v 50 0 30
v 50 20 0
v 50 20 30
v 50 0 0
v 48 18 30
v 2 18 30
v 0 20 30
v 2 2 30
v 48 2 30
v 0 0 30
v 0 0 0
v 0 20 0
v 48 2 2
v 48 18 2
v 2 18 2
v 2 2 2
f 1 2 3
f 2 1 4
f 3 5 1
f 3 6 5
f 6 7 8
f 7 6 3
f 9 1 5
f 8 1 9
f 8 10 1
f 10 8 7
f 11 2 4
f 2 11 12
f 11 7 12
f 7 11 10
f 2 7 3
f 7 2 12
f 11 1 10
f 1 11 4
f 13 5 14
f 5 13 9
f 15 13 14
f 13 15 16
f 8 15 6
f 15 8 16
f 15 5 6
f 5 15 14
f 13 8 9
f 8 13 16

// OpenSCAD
// Simple Box - Test Fixture
// A simple parametric box for testing

/*[Dimensions]*/
width = 50;  // [10:100]
height = 30; // [10:80]
depth = 20;  // [10:60]

/*[Options]*/
wall_thickness = 2; // [1:0.5:5]
include_lid = "yes"; // [yes, no]

/*[Hidden]*/
$fn = 32;

module box() {
    difference() {
        cube([width, depth, height]);
        translate([wall_thickness, wall_thickness, wall_thickness])
            cube([
                width - 2 * wall_thickness,
                depth - 2 * wall_thickness,
                height - wall_thickness
            ]);
    }
}

box();
